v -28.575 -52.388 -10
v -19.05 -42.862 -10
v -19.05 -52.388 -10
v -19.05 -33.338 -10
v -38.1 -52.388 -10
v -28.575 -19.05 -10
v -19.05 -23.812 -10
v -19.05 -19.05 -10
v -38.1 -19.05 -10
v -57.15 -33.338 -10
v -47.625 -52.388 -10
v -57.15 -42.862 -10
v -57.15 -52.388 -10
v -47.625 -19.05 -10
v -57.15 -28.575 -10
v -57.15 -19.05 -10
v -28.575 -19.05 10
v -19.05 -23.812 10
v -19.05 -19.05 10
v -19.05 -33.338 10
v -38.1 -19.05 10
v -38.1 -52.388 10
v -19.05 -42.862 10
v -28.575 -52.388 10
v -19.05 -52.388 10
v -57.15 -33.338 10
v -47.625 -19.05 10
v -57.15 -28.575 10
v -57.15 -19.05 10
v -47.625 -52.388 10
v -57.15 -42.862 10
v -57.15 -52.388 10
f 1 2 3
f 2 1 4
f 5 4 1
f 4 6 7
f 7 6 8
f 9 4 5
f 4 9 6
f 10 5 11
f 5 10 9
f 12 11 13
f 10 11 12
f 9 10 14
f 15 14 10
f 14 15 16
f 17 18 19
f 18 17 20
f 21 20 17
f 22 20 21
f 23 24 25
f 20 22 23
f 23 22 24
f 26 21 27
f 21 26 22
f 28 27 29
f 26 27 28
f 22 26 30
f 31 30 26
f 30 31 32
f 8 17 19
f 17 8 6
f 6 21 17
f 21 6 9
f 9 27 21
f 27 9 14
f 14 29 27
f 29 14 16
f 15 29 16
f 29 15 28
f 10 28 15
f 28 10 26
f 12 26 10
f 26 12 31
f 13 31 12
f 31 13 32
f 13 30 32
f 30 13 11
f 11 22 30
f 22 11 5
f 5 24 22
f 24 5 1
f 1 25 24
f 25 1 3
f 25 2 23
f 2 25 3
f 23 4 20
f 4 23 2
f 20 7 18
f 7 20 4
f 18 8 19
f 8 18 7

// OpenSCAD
polyhedron(
    points=[
    [-19.05, -19.05, -10],
    [-28.575, -19.05, -10],
    [-38.1, -19.05, -10],
    [-47.625, -19.05, -10],
    [-57.15, -19.05, -10],
    [-57.15, -28.575, -10],
    [-57.15, -33.3375, -10],
    [-57.15, -42.8625, -10],
    [-57.15, -52.3875, -10],
    [-47.625, -52.3875, -10],
    [-38.1, -52.3875, -10],
    [-28.575, -52.3875, -10],
    [-19.05, -52.3875, -10],
    [-19.05, -42.8625, -10],
    [-19.05, -33.3375, -10],
    [-19.05, -23.8125, -10],
    [-19.05, -19.05, 10],
    [-28.575, -19.05, 10],
    [-38.1, -19.05, 10],
    [-47.625, -19.05, 10],
    [-57.15, -19.05, 10],
    [-57.15, -28.575, 10],
    [-57.15, -33.3375, 10],
    [-57.15, -42.8625, 10],
    [-57.15, -52.3875, 10],
    [-47.625, -52.3875, 10],
    [-38.1, -52.3875, 10],
    [-28.575, -52.3875, 10],
    [-19.05, -52.3875, 10],
    [-19.05, -42.8625, 10],
    [-19.05, -33.3375, 10],
    [-19.05, -23.8125, 10],
    ],
    faces=[
        [0,1,2,3,4,5,6,7,8,9,10,11,12,13,14,15],
        [31,30,29,28,27,26,25,24,23,22,21,20,19,18,17,16],
        [0,16,17,1],
        [1,17,18,2],
        [2,18,19,3],
        [3,19,20,4],
        [4,20,21,5],
        [5,21,22,6],
        [6,22,23,7],
        [7,23,24,8],
        [8,24,25,9],
        [9,25,26,10],
        [10,26,27,11],
        [11,27,28,12],
        [12,28,29,13],
        [13,29,30,14],
        [14,30,31,15],
        [15,31,16,0],
    ]
);
